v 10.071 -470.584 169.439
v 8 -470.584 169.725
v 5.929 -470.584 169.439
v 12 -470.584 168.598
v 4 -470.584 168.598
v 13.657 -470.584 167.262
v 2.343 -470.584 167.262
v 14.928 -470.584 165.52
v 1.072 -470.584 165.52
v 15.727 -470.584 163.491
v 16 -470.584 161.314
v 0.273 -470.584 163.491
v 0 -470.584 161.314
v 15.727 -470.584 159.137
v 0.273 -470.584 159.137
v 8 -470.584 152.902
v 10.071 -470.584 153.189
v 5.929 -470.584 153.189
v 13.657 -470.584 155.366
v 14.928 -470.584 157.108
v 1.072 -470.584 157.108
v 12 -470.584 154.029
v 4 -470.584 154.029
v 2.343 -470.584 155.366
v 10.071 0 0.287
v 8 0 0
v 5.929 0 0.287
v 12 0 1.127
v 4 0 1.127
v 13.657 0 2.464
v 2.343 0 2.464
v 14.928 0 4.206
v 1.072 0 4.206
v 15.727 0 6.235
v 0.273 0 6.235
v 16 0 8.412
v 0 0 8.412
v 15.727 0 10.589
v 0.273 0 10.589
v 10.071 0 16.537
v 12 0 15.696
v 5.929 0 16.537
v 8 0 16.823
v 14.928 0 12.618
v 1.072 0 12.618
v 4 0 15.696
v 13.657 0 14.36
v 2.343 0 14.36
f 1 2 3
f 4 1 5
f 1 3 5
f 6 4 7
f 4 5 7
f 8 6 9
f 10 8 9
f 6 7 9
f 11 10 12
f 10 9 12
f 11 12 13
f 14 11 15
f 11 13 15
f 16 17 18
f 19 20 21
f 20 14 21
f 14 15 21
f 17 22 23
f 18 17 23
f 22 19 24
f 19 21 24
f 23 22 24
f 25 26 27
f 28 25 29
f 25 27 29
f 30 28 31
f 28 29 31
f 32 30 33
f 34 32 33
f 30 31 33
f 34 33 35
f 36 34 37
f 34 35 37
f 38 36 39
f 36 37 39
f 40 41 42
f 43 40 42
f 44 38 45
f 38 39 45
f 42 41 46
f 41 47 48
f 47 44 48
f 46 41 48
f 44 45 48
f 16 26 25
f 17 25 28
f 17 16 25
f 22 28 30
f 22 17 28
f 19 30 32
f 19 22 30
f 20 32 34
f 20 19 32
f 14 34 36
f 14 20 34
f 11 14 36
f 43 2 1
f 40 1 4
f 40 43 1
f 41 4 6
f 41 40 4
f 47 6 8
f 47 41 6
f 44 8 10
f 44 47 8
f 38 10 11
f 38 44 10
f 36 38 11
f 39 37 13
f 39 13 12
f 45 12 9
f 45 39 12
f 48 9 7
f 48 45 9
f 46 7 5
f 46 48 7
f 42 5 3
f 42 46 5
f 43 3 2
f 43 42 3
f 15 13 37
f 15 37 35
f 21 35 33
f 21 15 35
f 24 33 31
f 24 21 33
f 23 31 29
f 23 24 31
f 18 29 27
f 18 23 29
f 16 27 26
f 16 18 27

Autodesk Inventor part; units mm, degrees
ref_plane "YZ Plane" through (0, 0, 0) normal (1, 0, 0) x (0, 1, 0)
ref_plane "XZ Plane" through (0, 0, 0) normal (0, 1, 0) x (-1, 0, 0)
ref_plane "XY Plane" through (0, 0, 0) normal (0, 0, 1) x (1, 0, 0)
sketch "Sketch1" plane through (0, 0, 0) normal (1, 0, 0) x (0, 1, 0)
  line L0 (0, 0) -> (-475.5283, 154.5085)
  line L1 (0, 0) -> (500, 0) construction
  line L2 (-470.584, 169.7254) -> (2.5342, 16)
  line L3 (2.5342, 16) -> (500, 16)
  line L4 (0, 0) -> (0, 16.8234)
  line L5 (-470.584, 169.7254) -> (-470.584, 152.902)
  dimension "d0" = 500
  dimension "d1" = 162
  dimension "d2" = 16
extrude "Extrusion1" add sketch "Sketch1" along normal blind 16
fillet "Fillet1" radius 8 4 edges at (16, -235.292, 76.451) (0, -235.292, 76.451) (16, -235.292, 93.2744) (0, -235.292, 93.2744)
properties part number "Leg_Mockup"
